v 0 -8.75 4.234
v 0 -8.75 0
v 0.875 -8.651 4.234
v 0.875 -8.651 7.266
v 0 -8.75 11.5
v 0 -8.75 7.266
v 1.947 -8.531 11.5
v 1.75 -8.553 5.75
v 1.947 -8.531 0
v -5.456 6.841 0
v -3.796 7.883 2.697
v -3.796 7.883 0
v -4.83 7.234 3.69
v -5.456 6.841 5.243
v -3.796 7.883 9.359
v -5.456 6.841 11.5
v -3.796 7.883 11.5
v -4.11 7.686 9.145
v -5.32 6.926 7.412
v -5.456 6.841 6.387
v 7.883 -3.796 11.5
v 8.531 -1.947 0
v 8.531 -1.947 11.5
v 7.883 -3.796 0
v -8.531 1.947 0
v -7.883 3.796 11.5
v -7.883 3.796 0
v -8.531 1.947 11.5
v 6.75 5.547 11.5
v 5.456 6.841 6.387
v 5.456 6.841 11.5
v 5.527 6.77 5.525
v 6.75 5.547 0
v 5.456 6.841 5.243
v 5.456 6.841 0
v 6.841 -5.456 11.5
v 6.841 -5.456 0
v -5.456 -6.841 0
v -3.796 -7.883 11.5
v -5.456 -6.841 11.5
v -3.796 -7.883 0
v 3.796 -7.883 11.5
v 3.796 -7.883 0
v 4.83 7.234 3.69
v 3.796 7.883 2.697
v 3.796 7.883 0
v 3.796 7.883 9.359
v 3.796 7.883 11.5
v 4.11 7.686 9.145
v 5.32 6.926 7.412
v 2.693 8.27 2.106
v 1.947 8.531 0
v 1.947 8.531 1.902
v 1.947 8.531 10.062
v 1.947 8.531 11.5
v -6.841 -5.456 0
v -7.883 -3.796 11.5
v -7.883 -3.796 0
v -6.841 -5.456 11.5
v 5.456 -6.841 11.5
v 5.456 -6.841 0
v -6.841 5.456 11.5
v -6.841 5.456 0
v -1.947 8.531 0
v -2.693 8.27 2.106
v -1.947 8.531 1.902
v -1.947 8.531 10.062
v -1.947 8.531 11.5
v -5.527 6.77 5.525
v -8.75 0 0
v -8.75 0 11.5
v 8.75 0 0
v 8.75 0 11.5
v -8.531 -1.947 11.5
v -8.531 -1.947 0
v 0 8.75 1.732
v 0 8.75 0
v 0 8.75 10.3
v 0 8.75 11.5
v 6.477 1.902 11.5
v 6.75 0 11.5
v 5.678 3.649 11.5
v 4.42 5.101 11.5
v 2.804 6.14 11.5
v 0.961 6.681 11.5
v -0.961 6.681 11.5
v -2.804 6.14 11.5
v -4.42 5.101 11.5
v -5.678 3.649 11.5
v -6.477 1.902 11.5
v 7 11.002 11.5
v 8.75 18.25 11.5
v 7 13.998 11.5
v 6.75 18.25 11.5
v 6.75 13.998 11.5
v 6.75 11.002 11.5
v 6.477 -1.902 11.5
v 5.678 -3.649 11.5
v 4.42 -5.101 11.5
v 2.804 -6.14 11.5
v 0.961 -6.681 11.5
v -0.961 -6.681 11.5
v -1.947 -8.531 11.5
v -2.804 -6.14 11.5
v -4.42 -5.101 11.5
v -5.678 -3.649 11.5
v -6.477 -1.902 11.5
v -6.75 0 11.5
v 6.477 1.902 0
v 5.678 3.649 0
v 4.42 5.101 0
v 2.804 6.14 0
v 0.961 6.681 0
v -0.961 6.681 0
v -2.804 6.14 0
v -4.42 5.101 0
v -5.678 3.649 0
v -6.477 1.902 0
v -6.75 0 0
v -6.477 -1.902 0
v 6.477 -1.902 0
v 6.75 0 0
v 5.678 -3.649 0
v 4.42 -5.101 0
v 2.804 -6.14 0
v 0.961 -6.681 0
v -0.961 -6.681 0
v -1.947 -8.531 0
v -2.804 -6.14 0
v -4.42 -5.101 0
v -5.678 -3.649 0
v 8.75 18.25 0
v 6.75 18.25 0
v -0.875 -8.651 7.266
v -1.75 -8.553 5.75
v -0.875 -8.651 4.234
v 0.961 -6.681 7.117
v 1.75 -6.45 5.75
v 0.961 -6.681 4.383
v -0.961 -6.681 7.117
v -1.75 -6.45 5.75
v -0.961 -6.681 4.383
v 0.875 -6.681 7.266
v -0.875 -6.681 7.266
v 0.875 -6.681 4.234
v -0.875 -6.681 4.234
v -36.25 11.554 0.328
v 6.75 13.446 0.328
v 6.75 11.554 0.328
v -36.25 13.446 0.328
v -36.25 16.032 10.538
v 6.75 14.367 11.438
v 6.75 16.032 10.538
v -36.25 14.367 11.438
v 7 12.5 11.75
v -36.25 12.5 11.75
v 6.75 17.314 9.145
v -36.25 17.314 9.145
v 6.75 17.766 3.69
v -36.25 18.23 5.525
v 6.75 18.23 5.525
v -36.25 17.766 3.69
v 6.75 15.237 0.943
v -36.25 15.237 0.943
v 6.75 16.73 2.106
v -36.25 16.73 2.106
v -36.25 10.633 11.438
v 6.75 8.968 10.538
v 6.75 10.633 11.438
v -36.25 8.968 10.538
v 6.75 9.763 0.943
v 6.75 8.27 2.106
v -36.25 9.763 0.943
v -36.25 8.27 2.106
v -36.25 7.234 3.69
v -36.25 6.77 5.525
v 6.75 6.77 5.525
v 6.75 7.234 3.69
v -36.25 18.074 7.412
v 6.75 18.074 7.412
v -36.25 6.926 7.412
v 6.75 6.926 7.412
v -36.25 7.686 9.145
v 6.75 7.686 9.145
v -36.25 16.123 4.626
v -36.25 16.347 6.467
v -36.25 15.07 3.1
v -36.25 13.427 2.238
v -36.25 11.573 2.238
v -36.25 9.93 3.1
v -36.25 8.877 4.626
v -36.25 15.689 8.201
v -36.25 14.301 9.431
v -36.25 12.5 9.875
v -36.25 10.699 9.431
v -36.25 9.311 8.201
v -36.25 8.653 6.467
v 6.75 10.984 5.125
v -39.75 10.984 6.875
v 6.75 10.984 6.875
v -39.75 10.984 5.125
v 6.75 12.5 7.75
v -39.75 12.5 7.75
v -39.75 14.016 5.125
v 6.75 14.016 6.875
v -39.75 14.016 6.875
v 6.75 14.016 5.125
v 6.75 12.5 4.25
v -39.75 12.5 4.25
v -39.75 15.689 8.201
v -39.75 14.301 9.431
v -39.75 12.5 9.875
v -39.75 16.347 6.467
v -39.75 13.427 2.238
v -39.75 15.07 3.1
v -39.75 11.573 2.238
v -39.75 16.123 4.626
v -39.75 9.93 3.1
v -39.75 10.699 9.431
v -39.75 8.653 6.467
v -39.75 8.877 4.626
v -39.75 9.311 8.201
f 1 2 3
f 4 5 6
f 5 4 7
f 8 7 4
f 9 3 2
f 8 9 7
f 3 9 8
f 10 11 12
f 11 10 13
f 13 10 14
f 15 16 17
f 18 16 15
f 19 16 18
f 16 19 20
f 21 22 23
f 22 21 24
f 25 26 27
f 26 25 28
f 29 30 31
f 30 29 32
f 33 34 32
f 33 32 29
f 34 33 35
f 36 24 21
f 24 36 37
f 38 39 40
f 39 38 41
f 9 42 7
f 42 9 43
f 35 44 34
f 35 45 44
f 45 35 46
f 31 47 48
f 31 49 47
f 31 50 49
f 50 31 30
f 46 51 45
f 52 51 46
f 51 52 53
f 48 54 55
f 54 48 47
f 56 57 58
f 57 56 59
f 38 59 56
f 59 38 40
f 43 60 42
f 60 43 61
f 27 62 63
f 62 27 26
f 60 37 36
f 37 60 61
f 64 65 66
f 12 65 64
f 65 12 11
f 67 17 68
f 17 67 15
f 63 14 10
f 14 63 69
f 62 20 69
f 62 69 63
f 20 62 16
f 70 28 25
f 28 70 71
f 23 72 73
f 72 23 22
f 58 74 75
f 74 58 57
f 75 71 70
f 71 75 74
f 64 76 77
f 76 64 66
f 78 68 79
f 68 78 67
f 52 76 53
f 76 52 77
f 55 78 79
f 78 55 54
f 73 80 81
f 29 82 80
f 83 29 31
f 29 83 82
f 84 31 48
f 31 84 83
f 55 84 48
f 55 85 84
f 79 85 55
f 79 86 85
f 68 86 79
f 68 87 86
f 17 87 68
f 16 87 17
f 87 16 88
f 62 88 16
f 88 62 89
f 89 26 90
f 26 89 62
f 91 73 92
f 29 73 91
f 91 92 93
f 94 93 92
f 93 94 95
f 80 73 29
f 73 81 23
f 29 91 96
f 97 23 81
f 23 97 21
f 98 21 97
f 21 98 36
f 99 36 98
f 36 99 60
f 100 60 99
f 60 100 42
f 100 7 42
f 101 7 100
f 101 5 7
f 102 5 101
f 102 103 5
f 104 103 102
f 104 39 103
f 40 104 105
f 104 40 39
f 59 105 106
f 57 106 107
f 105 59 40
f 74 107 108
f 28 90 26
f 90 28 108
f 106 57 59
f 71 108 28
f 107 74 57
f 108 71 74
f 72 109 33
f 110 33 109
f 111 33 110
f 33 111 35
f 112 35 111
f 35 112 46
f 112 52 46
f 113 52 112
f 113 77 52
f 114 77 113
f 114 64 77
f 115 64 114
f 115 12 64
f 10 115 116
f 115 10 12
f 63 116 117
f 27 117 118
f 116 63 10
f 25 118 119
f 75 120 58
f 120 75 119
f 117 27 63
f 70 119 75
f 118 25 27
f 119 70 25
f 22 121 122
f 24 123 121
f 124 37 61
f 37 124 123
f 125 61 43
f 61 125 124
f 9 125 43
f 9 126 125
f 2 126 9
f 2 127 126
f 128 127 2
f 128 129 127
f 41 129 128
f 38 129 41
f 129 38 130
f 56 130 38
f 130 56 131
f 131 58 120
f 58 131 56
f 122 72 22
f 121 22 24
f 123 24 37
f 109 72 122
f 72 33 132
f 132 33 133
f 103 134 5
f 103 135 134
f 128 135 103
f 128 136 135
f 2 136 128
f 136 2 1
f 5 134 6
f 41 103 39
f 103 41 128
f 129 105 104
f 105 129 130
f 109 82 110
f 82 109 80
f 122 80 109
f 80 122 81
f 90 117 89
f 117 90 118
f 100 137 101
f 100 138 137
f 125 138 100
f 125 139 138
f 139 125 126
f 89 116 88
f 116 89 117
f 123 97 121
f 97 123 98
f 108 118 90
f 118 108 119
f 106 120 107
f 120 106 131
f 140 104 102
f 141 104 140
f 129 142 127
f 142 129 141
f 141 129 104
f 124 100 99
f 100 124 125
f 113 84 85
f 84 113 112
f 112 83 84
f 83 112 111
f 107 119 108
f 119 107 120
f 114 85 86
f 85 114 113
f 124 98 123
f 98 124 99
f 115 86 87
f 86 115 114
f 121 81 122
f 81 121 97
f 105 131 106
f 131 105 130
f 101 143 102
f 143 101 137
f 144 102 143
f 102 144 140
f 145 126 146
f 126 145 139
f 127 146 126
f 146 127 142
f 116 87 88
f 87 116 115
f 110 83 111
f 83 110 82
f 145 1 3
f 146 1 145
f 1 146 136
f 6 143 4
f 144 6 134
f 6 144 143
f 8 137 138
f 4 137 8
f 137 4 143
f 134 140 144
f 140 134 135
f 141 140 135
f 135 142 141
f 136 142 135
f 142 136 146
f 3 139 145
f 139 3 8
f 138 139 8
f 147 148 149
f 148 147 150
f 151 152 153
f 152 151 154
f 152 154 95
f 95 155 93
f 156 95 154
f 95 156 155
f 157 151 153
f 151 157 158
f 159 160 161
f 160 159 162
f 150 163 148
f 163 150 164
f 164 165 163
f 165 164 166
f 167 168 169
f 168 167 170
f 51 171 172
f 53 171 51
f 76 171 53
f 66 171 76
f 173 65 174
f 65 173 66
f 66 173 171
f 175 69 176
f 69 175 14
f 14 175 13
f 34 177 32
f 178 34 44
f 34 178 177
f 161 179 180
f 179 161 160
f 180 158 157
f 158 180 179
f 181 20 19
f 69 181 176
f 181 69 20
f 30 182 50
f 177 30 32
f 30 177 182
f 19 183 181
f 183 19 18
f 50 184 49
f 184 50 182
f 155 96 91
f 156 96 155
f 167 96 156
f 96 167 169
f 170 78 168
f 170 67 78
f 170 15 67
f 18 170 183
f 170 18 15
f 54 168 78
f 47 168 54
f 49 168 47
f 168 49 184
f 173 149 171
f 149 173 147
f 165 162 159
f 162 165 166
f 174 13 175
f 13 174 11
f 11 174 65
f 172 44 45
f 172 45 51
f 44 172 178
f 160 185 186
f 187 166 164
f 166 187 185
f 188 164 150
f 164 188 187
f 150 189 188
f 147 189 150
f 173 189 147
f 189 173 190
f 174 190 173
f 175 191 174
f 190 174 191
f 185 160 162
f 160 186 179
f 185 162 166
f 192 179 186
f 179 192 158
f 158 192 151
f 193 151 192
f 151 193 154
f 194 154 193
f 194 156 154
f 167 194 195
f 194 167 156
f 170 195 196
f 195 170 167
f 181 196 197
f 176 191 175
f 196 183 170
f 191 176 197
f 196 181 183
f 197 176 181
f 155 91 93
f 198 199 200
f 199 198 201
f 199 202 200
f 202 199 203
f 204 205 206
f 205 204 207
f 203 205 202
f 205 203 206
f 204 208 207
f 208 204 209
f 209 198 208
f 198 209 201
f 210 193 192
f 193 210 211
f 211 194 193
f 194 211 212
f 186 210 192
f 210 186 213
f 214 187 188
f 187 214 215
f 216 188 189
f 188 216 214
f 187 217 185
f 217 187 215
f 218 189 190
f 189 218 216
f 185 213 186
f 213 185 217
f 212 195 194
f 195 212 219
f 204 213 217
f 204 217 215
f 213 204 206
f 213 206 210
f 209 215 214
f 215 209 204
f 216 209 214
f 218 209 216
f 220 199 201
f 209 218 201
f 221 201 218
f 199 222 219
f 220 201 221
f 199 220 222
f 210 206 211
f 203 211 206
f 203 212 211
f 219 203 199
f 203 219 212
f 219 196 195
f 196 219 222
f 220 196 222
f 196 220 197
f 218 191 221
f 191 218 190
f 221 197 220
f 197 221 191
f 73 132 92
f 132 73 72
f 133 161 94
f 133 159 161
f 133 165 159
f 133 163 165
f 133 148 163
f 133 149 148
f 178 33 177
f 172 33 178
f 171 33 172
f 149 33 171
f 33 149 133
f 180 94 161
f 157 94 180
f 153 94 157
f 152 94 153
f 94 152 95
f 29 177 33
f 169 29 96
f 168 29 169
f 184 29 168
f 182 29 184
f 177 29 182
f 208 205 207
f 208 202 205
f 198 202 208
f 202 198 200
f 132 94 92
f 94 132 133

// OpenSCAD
union() {
	difference() {
		cylinder(d = 17.5000000000, h = 11.5000000000);
		translate(v = [0, 0, -5.7500000000]) {
			cylinder(d = 13.5000000000, h = 23.0000000000);
		}
		translate(v = [0, 0, 5.7500000000]) {
			rotate(a = [90, 0, 0]) {
				cylinder(d = 3.5000000000, h = 30);
			}
		}
	}
	translate(v = [0, 0, 6.0000000000]) {
		translate(v = [0, 12.5000000000, 0]) {
			translate(v = [8.7500000000, 0, 0]) {
				rotate(a = [0, 270, 0]) {
					translate(v = [0, 0, 1.7500000000]) {
						union() {
							difference() {
								cylinder(d = 11.5000000000, h = 43.2500000000);
								translate(v = [0, 0, -21.6250000000]) {
									cylinder(d = 3.5000000000, h = 86.5000000000);
								}
							}
							translate(v = [0, 0, 43.2500000000]) {
								difference() {
									cylinder(d = 7.7500000000, h = 3.5000000000);
									translate(v = [0, 0, -1.7500000000]) {
										cylinder(d = 3.5000000000, h = 7.0000000000);
									}
								}
							}
						}
					}
				}
			}
		}
	}
	translate(v = [7.7500000000, 0, 0]) {
		translate(v = [0, 9.1250000000, 0]) {
			translate(v = [0, 0, 5.7500000000]) {
				cube(center = true, size = [2, 18.2500000000, 11.5000000000]);
			}
		}
	}
}
